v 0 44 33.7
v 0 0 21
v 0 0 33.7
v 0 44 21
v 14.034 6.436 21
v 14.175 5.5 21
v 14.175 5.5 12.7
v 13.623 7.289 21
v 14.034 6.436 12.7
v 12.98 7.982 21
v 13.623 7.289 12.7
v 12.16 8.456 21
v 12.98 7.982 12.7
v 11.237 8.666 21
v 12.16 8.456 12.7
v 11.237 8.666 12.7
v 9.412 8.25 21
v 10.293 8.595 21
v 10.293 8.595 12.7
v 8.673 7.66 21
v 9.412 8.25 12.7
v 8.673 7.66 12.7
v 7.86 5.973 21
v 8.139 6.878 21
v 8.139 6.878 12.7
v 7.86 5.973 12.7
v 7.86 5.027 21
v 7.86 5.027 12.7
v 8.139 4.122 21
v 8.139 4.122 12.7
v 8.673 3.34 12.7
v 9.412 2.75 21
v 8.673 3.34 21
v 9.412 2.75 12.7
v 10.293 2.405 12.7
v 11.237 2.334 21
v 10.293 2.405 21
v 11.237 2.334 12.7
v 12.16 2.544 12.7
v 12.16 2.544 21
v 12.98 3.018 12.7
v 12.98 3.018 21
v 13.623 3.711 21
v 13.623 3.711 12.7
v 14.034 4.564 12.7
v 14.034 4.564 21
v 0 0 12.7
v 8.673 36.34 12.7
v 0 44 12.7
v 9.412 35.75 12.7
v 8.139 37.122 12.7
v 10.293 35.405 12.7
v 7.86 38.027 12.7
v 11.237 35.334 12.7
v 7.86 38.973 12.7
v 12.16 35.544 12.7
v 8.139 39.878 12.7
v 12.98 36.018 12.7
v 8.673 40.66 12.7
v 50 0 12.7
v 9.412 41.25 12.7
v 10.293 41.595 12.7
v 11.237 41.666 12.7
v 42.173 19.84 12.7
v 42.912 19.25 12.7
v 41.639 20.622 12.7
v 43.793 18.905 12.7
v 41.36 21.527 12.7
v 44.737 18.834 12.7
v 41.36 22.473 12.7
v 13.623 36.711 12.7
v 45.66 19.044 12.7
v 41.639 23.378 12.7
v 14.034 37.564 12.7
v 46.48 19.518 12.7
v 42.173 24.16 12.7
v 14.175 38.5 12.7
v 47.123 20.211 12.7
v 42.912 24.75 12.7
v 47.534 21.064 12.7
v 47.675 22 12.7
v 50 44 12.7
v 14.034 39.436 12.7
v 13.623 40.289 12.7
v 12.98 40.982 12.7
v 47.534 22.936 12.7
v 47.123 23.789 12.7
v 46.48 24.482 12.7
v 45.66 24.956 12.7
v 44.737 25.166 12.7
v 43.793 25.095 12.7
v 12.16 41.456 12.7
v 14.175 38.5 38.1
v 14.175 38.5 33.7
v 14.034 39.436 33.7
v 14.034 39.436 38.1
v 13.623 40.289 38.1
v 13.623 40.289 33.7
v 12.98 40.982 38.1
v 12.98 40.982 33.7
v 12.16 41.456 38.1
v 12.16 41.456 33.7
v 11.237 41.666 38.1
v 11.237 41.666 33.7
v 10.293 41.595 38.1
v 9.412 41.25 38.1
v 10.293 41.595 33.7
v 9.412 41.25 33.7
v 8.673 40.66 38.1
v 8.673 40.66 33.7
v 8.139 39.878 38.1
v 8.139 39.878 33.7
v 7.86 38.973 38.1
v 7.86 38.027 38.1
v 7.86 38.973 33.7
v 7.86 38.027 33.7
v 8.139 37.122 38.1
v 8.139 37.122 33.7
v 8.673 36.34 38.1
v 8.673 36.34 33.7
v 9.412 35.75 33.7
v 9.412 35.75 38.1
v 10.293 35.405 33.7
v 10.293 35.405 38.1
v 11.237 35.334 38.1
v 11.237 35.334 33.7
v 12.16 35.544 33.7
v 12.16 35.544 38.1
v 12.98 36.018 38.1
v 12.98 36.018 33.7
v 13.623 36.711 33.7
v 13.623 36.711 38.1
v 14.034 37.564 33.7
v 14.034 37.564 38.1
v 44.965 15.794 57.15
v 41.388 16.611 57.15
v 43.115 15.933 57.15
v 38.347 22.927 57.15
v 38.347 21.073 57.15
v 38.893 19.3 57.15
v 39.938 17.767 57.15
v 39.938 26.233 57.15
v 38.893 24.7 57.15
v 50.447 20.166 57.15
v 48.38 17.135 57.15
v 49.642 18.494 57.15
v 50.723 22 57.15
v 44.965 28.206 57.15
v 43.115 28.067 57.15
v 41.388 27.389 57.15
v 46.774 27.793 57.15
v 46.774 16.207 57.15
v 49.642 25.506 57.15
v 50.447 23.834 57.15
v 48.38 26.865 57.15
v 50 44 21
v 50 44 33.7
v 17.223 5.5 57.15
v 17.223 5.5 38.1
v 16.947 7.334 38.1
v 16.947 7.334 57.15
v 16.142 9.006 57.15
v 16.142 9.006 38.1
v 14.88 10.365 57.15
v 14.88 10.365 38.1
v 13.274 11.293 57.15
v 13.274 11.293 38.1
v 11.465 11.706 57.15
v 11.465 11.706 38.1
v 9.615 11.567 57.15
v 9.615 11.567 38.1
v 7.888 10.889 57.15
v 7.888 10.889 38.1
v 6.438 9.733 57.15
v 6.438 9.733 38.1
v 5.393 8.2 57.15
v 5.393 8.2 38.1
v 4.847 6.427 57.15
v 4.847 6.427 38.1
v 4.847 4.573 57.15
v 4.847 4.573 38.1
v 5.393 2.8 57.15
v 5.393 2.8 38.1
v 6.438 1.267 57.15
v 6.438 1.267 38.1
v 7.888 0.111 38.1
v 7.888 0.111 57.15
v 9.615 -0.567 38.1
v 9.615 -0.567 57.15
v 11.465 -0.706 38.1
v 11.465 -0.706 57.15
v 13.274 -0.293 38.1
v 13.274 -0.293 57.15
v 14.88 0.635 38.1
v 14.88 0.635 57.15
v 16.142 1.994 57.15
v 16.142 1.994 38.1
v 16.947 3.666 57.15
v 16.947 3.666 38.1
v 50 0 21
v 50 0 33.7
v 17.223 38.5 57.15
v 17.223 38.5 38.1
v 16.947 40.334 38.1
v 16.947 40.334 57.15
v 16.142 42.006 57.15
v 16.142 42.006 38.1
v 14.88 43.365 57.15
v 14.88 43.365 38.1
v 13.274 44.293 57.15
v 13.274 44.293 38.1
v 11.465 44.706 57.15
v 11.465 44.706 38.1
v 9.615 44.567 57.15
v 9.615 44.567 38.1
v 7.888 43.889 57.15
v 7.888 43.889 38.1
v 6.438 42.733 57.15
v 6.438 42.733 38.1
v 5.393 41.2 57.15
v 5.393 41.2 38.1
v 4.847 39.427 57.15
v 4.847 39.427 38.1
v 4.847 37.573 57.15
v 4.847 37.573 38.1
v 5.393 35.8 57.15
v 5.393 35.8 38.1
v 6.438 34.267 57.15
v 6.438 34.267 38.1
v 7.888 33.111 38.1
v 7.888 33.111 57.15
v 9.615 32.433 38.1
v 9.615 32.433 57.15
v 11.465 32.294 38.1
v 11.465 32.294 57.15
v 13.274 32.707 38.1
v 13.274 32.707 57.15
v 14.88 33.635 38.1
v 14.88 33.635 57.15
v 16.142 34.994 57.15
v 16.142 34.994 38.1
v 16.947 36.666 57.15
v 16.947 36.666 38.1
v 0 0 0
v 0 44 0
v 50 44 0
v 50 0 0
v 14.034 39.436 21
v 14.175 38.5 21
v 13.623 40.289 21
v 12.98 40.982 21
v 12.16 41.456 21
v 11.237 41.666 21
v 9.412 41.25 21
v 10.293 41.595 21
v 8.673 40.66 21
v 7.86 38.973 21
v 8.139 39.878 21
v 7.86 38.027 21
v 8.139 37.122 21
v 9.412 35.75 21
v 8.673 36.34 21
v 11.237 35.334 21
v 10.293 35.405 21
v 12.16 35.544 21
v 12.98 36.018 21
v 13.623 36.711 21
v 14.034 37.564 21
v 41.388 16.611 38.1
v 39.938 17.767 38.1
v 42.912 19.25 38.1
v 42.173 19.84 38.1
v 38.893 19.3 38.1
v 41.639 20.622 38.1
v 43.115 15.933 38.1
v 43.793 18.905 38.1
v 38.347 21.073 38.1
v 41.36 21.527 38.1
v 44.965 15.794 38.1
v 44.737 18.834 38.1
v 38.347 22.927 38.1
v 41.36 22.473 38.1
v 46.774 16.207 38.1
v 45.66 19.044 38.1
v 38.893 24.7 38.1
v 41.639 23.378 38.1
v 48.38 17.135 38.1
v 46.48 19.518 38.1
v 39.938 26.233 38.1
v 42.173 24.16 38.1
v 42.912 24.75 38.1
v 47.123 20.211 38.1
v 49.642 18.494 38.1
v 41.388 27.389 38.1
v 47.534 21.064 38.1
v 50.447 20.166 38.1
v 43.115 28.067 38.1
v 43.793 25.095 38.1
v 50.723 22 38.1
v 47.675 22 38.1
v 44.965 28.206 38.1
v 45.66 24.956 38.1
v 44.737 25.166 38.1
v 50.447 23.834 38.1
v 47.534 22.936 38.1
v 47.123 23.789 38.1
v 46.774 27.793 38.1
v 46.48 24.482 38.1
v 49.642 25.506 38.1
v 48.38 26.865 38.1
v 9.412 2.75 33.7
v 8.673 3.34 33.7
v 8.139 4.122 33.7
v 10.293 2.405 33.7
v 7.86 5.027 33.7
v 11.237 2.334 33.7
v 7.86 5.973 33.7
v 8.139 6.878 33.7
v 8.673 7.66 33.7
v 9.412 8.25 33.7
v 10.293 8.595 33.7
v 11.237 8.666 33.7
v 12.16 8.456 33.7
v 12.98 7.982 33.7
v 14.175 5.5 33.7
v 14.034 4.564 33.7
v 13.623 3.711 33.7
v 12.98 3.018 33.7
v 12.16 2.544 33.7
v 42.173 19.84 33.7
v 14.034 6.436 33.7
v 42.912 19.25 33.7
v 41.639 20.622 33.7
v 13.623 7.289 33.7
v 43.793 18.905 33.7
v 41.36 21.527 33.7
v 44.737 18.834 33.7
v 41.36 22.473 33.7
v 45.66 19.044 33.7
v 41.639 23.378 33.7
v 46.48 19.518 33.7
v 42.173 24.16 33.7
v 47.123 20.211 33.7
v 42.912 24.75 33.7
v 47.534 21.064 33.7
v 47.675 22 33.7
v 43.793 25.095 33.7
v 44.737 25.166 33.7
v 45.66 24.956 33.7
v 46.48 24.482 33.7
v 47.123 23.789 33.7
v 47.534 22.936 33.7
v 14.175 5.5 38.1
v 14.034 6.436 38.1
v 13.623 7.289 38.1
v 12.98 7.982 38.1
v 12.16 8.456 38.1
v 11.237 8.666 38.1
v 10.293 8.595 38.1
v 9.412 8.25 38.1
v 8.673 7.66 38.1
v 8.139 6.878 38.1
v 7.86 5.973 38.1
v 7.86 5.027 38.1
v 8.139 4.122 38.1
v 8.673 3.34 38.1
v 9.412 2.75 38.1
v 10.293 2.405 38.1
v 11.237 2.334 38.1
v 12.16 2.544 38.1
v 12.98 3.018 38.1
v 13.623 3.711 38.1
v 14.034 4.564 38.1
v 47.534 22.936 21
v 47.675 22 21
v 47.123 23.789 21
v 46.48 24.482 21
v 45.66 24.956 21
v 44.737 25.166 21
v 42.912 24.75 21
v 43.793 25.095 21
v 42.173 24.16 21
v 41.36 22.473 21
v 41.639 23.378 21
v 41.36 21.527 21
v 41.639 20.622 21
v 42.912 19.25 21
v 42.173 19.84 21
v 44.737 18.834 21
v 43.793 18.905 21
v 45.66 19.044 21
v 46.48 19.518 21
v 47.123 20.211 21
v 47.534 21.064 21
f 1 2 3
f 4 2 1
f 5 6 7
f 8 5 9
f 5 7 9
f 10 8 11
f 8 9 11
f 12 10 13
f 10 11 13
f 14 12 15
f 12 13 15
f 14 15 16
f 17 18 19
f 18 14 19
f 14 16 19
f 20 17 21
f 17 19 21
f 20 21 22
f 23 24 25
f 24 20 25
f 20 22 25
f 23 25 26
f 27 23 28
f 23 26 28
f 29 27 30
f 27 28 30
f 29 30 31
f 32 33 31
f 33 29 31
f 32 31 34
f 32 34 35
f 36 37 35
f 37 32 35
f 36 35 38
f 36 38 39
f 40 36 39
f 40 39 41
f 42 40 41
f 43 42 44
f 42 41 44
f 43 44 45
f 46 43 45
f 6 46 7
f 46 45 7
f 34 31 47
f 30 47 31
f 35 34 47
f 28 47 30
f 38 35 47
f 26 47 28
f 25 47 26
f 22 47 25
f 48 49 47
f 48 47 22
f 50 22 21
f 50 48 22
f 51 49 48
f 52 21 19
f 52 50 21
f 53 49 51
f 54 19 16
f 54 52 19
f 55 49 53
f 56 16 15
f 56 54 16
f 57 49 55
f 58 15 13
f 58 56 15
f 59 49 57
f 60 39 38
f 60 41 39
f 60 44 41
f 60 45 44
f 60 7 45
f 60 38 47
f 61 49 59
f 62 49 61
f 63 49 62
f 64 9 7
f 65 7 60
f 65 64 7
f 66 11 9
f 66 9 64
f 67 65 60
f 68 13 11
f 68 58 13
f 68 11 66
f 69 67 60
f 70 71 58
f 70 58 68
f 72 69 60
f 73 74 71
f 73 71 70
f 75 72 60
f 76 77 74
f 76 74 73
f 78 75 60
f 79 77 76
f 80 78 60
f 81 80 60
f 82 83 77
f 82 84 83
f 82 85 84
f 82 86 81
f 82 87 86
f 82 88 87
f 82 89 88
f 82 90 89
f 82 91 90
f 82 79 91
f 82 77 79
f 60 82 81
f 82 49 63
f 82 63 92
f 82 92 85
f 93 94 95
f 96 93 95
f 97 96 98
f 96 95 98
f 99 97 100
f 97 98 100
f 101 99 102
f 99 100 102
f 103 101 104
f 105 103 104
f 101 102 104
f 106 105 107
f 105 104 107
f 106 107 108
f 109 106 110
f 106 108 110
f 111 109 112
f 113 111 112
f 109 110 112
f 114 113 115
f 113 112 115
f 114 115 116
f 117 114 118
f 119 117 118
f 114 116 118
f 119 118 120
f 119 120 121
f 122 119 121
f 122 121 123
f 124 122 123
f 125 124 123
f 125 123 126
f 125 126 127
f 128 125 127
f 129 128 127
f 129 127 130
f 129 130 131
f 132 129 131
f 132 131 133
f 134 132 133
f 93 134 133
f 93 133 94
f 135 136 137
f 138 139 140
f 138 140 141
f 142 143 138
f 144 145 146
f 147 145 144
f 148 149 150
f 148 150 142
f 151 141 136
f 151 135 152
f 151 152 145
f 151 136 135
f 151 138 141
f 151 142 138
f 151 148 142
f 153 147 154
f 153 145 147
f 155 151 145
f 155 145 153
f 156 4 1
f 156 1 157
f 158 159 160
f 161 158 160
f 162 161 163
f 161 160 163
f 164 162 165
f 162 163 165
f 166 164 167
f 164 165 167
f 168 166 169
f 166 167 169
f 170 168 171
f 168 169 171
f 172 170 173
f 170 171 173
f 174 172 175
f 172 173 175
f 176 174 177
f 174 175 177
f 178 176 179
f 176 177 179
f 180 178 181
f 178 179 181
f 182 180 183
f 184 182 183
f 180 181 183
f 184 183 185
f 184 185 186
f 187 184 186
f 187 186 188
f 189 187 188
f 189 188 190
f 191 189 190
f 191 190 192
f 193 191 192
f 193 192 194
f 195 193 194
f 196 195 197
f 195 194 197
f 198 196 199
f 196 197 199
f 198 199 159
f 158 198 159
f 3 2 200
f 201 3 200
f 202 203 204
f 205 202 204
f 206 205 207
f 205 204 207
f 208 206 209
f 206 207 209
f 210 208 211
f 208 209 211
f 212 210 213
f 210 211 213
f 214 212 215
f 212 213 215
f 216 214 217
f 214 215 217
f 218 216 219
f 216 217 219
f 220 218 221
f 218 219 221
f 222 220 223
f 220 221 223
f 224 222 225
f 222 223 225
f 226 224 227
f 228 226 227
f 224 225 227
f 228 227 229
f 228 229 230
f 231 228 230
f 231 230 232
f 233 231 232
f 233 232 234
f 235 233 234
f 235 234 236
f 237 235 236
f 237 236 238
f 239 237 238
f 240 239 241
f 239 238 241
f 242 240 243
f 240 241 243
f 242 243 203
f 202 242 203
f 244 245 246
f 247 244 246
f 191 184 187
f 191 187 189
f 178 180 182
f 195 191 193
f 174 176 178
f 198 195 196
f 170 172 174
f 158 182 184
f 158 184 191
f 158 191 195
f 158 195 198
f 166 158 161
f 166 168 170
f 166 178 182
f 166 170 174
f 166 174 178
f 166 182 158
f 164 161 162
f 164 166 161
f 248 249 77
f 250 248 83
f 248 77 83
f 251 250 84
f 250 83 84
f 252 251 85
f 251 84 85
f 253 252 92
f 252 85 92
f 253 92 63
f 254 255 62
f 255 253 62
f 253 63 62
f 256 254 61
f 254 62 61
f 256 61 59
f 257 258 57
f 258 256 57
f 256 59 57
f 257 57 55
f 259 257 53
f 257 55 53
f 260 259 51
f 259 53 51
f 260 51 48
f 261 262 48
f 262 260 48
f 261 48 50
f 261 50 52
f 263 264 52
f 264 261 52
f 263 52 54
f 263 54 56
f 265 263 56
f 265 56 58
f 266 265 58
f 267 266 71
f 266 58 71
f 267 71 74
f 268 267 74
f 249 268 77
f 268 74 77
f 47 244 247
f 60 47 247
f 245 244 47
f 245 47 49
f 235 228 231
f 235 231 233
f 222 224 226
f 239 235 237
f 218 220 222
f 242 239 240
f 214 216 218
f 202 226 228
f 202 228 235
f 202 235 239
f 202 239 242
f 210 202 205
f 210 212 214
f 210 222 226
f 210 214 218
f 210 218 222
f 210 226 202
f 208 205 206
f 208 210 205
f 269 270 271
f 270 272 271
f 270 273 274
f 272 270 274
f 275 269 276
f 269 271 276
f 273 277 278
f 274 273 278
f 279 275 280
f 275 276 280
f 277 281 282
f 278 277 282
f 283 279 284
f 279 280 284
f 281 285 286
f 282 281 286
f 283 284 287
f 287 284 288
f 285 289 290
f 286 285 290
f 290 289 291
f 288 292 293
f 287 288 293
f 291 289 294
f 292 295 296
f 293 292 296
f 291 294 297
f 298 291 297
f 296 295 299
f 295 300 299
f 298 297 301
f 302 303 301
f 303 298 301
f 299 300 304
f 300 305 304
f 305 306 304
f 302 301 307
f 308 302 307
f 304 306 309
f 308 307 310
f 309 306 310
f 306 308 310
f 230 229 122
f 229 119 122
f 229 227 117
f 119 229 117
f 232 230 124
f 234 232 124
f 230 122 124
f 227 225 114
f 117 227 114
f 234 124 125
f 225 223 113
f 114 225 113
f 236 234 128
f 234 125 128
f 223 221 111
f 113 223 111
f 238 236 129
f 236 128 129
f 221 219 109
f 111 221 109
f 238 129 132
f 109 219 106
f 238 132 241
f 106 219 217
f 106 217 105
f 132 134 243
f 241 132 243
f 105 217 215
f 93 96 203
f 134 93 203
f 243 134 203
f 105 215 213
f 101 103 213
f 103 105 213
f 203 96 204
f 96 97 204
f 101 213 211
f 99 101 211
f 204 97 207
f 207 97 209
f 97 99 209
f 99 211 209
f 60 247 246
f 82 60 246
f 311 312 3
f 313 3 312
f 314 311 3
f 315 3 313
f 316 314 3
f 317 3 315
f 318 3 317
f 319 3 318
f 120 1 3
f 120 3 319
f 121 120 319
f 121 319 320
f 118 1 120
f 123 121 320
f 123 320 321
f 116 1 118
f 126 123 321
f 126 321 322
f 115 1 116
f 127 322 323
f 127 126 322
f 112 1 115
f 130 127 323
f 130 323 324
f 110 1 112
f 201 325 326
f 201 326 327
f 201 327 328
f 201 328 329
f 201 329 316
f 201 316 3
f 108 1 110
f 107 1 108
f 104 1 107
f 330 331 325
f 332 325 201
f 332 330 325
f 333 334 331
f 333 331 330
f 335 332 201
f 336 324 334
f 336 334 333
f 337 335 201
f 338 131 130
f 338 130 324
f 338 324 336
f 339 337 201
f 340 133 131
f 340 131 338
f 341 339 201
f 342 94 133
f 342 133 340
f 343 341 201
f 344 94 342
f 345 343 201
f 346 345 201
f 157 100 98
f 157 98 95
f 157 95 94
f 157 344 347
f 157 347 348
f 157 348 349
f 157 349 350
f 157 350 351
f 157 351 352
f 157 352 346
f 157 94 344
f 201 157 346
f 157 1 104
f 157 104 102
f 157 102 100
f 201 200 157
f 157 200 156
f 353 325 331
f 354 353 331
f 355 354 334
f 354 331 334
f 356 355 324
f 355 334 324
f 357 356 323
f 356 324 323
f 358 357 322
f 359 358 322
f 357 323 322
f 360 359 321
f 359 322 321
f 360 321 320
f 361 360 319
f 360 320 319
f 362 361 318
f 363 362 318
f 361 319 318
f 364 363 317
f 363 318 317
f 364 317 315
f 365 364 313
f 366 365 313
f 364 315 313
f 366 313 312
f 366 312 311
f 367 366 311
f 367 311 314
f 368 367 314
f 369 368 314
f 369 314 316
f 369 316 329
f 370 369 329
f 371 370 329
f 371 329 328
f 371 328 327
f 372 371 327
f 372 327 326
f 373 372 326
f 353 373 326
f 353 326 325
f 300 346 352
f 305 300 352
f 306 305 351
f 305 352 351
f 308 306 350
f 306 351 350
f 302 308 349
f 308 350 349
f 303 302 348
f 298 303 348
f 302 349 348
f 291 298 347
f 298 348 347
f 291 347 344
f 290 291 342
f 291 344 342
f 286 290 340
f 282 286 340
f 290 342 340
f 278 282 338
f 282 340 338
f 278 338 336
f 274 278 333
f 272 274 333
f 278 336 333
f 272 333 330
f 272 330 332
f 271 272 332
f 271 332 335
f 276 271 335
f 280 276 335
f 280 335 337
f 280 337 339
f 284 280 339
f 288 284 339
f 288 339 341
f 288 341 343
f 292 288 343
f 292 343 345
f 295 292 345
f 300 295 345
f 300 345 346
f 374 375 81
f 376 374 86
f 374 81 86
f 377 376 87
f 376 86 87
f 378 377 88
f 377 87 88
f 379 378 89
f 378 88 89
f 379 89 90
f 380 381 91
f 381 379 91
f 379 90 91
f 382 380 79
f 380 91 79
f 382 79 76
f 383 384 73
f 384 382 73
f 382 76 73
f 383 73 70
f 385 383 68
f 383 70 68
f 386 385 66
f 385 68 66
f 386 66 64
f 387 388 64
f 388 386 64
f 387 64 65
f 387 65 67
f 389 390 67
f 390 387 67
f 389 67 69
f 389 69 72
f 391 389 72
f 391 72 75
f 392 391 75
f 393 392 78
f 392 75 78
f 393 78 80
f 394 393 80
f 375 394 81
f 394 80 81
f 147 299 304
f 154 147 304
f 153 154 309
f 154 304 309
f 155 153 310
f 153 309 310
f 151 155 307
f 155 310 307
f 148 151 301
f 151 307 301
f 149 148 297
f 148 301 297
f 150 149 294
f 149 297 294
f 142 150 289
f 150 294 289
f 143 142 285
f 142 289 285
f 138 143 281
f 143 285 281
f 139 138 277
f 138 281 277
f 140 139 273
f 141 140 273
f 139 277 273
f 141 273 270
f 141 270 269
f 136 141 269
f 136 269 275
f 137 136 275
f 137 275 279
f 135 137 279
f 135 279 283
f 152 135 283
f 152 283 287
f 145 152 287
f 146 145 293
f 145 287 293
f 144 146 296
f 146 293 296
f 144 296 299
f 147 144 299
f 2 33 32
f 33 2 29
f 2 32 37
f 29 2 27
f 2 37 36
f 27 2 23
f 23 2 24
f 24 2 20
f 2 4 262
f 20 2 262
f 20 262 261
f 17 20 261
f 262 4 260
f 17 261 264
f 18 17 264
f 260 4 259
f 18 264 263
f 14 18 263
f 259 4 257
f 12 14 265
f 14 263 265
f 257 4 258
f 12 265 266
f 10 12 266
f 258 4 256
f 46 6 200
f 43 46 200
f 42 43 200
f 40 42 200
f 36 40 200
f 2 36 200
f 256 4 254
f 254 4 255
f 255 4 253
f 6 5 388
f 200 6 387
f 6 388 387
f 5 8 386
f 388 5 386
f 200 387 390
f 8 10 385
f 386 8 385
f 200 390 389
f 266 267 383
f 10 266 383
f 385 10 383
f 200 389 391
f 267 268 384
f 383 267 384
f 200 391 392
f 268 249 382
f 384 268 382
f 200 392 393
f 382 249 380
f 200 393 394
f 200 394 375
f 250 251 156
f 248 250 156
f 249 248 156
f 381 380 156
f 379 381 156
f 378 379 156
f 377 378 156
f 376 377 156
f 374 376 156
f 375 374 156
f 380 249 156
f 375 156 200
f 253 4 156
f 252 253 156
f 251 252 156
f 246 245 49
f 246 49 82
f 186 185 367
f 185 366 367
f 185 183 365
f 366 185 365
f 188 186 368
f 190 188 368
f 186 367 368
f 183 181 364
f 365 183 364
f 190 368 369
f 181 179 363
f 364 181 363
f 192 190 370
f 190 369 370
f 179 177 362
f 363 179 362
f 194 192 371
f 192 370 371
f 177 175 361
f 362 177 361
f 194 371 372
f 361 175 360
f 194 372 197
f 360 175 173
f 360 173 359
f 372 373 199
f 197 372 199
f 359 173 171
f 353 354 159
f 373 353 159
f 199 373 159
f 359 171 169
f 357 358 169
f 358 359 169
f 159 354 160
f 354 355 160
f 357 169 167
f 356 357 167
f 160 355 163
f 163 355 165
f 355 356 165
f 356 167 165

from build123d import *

# Parameters (mm, degrees)
BOX001_W          = 50
BOX001_H          = 44
BOX001_DEPTH      = 12.7
CYLINDER001_R     = 6.223
CYLINDER001_DEPTH = 19.05
CYLINDER_R        = 3.175
CYLINDER_DEPTH    = 25.4
CYLINDER003_R     = 6.223
CYLINDER003_DEPTH = 19.05
CYLINDER002_R     = 3.175
CYLINDER002_DEPTH = 25.4
CYLINDER005_R     = 6.223
CYLINDER005_DEPTH = 19.05
CYLINDER004_R     = 3.175
CYLINDER004_DEPTH = 25.4
BOX_W             = 50
BOX_H             = 44
BOX_DEPTH         = 12.7


with BuildPart() as top_plate:
    # Box001 → Box001 (new body)
    with BuildSketch(Plane.XY.offset(21)):
        with Locations((25, 22)):
            Rectangle(BOX001_W, BOX001_H)
    extrude(amount=BOX001_DEPTH)


with BuildPart() as screw_cap:
    # Cylinder001 → Cylinder001 (new body)
    with BuildSketch(Plane.XY.offset(25.4)):
        Circle(CYLINDER001_R)
    extrude(amount=CYLINDER001_DEPTH)


with BuildPart() as left_screw:
    # Cylinder → Cylinder (new body)
    with BuildSketch(Plane.XY):
        Circle(CYLINDER_R)
    extrude(amount=CYLINDER_DEPTH)

    # Fusion: union Screw Cap
    add(screw_cap.part)


with BuildPart() as left_screw_1:
    # Fusion placement: moved
    add(left_screw.part.moved(Location((11, 5.5, 12.7))))


with BuildPart() as screw_cap001:
    # Cylinder003 → Cylinder003 (new body)
    with BuildSketch(Plane.XY.offset(25.4)):
        Circle(CYLINDER003_R)
    extrude(amount=CYLINDER003_DEPTH)


with BuildPart() as right_screw:
    # Cylinder002 → Cylinder002 (new body)
    with BuildSketch(Plane.XY):
        Circle(CYLINDER002_R)
    extrude(amount=CYLINDER002_DEPTH)

    # Fusion001: union Screw Cap001
    add(screw_cap001.part)


with BuildPart() as right_screw_1:
    # Fusion001 placement: moved
    add(right_screw.part.moved(Location((11, 38.5, 12.7))))


with BuildPart() as screw_cap002:
    # Cylinder005 → Cylinder005 (new body)
    with BuildSketch(Plane.XY.offset(25.4)):
        Circle(CYLINDER005_R)
    extrude(amount=CYLINDER005_DEPTH)


with BuildPart() as center_screw:
    # Cylinder004 → Cylinder004 (new body)
    with BuildSketch(Plane.XY):
        Circle(CYLINDER004_R)
    extrude(amount=CYLINDER004_DEPTH)

    # Fusion002: union Screw Cap002
    add(screw_cap002.part)


with BuildPart() as center_screw_1:
    # Fusion002 placement: moved
    add(center_screw.part.moved(Location((44.5, 22, 12.7))))


with BuildPart() as fusion003:
    # Box → Box (new body)
    with BuildSketch(Plane.XY):
        with Locations((25, 22)):
            Rectangle(BOX_W, BOX_H)
    extrude(amount=BOX_DEPTH)

    # Fusion003: union Top Plate, Left Screw, Right Screw, Center Screw
    add(top_plate.part)
    add(left_screw_1.part)
    add(right_screw_1.part)
    add(center_screw_1.part)


solid = fusion003.part
